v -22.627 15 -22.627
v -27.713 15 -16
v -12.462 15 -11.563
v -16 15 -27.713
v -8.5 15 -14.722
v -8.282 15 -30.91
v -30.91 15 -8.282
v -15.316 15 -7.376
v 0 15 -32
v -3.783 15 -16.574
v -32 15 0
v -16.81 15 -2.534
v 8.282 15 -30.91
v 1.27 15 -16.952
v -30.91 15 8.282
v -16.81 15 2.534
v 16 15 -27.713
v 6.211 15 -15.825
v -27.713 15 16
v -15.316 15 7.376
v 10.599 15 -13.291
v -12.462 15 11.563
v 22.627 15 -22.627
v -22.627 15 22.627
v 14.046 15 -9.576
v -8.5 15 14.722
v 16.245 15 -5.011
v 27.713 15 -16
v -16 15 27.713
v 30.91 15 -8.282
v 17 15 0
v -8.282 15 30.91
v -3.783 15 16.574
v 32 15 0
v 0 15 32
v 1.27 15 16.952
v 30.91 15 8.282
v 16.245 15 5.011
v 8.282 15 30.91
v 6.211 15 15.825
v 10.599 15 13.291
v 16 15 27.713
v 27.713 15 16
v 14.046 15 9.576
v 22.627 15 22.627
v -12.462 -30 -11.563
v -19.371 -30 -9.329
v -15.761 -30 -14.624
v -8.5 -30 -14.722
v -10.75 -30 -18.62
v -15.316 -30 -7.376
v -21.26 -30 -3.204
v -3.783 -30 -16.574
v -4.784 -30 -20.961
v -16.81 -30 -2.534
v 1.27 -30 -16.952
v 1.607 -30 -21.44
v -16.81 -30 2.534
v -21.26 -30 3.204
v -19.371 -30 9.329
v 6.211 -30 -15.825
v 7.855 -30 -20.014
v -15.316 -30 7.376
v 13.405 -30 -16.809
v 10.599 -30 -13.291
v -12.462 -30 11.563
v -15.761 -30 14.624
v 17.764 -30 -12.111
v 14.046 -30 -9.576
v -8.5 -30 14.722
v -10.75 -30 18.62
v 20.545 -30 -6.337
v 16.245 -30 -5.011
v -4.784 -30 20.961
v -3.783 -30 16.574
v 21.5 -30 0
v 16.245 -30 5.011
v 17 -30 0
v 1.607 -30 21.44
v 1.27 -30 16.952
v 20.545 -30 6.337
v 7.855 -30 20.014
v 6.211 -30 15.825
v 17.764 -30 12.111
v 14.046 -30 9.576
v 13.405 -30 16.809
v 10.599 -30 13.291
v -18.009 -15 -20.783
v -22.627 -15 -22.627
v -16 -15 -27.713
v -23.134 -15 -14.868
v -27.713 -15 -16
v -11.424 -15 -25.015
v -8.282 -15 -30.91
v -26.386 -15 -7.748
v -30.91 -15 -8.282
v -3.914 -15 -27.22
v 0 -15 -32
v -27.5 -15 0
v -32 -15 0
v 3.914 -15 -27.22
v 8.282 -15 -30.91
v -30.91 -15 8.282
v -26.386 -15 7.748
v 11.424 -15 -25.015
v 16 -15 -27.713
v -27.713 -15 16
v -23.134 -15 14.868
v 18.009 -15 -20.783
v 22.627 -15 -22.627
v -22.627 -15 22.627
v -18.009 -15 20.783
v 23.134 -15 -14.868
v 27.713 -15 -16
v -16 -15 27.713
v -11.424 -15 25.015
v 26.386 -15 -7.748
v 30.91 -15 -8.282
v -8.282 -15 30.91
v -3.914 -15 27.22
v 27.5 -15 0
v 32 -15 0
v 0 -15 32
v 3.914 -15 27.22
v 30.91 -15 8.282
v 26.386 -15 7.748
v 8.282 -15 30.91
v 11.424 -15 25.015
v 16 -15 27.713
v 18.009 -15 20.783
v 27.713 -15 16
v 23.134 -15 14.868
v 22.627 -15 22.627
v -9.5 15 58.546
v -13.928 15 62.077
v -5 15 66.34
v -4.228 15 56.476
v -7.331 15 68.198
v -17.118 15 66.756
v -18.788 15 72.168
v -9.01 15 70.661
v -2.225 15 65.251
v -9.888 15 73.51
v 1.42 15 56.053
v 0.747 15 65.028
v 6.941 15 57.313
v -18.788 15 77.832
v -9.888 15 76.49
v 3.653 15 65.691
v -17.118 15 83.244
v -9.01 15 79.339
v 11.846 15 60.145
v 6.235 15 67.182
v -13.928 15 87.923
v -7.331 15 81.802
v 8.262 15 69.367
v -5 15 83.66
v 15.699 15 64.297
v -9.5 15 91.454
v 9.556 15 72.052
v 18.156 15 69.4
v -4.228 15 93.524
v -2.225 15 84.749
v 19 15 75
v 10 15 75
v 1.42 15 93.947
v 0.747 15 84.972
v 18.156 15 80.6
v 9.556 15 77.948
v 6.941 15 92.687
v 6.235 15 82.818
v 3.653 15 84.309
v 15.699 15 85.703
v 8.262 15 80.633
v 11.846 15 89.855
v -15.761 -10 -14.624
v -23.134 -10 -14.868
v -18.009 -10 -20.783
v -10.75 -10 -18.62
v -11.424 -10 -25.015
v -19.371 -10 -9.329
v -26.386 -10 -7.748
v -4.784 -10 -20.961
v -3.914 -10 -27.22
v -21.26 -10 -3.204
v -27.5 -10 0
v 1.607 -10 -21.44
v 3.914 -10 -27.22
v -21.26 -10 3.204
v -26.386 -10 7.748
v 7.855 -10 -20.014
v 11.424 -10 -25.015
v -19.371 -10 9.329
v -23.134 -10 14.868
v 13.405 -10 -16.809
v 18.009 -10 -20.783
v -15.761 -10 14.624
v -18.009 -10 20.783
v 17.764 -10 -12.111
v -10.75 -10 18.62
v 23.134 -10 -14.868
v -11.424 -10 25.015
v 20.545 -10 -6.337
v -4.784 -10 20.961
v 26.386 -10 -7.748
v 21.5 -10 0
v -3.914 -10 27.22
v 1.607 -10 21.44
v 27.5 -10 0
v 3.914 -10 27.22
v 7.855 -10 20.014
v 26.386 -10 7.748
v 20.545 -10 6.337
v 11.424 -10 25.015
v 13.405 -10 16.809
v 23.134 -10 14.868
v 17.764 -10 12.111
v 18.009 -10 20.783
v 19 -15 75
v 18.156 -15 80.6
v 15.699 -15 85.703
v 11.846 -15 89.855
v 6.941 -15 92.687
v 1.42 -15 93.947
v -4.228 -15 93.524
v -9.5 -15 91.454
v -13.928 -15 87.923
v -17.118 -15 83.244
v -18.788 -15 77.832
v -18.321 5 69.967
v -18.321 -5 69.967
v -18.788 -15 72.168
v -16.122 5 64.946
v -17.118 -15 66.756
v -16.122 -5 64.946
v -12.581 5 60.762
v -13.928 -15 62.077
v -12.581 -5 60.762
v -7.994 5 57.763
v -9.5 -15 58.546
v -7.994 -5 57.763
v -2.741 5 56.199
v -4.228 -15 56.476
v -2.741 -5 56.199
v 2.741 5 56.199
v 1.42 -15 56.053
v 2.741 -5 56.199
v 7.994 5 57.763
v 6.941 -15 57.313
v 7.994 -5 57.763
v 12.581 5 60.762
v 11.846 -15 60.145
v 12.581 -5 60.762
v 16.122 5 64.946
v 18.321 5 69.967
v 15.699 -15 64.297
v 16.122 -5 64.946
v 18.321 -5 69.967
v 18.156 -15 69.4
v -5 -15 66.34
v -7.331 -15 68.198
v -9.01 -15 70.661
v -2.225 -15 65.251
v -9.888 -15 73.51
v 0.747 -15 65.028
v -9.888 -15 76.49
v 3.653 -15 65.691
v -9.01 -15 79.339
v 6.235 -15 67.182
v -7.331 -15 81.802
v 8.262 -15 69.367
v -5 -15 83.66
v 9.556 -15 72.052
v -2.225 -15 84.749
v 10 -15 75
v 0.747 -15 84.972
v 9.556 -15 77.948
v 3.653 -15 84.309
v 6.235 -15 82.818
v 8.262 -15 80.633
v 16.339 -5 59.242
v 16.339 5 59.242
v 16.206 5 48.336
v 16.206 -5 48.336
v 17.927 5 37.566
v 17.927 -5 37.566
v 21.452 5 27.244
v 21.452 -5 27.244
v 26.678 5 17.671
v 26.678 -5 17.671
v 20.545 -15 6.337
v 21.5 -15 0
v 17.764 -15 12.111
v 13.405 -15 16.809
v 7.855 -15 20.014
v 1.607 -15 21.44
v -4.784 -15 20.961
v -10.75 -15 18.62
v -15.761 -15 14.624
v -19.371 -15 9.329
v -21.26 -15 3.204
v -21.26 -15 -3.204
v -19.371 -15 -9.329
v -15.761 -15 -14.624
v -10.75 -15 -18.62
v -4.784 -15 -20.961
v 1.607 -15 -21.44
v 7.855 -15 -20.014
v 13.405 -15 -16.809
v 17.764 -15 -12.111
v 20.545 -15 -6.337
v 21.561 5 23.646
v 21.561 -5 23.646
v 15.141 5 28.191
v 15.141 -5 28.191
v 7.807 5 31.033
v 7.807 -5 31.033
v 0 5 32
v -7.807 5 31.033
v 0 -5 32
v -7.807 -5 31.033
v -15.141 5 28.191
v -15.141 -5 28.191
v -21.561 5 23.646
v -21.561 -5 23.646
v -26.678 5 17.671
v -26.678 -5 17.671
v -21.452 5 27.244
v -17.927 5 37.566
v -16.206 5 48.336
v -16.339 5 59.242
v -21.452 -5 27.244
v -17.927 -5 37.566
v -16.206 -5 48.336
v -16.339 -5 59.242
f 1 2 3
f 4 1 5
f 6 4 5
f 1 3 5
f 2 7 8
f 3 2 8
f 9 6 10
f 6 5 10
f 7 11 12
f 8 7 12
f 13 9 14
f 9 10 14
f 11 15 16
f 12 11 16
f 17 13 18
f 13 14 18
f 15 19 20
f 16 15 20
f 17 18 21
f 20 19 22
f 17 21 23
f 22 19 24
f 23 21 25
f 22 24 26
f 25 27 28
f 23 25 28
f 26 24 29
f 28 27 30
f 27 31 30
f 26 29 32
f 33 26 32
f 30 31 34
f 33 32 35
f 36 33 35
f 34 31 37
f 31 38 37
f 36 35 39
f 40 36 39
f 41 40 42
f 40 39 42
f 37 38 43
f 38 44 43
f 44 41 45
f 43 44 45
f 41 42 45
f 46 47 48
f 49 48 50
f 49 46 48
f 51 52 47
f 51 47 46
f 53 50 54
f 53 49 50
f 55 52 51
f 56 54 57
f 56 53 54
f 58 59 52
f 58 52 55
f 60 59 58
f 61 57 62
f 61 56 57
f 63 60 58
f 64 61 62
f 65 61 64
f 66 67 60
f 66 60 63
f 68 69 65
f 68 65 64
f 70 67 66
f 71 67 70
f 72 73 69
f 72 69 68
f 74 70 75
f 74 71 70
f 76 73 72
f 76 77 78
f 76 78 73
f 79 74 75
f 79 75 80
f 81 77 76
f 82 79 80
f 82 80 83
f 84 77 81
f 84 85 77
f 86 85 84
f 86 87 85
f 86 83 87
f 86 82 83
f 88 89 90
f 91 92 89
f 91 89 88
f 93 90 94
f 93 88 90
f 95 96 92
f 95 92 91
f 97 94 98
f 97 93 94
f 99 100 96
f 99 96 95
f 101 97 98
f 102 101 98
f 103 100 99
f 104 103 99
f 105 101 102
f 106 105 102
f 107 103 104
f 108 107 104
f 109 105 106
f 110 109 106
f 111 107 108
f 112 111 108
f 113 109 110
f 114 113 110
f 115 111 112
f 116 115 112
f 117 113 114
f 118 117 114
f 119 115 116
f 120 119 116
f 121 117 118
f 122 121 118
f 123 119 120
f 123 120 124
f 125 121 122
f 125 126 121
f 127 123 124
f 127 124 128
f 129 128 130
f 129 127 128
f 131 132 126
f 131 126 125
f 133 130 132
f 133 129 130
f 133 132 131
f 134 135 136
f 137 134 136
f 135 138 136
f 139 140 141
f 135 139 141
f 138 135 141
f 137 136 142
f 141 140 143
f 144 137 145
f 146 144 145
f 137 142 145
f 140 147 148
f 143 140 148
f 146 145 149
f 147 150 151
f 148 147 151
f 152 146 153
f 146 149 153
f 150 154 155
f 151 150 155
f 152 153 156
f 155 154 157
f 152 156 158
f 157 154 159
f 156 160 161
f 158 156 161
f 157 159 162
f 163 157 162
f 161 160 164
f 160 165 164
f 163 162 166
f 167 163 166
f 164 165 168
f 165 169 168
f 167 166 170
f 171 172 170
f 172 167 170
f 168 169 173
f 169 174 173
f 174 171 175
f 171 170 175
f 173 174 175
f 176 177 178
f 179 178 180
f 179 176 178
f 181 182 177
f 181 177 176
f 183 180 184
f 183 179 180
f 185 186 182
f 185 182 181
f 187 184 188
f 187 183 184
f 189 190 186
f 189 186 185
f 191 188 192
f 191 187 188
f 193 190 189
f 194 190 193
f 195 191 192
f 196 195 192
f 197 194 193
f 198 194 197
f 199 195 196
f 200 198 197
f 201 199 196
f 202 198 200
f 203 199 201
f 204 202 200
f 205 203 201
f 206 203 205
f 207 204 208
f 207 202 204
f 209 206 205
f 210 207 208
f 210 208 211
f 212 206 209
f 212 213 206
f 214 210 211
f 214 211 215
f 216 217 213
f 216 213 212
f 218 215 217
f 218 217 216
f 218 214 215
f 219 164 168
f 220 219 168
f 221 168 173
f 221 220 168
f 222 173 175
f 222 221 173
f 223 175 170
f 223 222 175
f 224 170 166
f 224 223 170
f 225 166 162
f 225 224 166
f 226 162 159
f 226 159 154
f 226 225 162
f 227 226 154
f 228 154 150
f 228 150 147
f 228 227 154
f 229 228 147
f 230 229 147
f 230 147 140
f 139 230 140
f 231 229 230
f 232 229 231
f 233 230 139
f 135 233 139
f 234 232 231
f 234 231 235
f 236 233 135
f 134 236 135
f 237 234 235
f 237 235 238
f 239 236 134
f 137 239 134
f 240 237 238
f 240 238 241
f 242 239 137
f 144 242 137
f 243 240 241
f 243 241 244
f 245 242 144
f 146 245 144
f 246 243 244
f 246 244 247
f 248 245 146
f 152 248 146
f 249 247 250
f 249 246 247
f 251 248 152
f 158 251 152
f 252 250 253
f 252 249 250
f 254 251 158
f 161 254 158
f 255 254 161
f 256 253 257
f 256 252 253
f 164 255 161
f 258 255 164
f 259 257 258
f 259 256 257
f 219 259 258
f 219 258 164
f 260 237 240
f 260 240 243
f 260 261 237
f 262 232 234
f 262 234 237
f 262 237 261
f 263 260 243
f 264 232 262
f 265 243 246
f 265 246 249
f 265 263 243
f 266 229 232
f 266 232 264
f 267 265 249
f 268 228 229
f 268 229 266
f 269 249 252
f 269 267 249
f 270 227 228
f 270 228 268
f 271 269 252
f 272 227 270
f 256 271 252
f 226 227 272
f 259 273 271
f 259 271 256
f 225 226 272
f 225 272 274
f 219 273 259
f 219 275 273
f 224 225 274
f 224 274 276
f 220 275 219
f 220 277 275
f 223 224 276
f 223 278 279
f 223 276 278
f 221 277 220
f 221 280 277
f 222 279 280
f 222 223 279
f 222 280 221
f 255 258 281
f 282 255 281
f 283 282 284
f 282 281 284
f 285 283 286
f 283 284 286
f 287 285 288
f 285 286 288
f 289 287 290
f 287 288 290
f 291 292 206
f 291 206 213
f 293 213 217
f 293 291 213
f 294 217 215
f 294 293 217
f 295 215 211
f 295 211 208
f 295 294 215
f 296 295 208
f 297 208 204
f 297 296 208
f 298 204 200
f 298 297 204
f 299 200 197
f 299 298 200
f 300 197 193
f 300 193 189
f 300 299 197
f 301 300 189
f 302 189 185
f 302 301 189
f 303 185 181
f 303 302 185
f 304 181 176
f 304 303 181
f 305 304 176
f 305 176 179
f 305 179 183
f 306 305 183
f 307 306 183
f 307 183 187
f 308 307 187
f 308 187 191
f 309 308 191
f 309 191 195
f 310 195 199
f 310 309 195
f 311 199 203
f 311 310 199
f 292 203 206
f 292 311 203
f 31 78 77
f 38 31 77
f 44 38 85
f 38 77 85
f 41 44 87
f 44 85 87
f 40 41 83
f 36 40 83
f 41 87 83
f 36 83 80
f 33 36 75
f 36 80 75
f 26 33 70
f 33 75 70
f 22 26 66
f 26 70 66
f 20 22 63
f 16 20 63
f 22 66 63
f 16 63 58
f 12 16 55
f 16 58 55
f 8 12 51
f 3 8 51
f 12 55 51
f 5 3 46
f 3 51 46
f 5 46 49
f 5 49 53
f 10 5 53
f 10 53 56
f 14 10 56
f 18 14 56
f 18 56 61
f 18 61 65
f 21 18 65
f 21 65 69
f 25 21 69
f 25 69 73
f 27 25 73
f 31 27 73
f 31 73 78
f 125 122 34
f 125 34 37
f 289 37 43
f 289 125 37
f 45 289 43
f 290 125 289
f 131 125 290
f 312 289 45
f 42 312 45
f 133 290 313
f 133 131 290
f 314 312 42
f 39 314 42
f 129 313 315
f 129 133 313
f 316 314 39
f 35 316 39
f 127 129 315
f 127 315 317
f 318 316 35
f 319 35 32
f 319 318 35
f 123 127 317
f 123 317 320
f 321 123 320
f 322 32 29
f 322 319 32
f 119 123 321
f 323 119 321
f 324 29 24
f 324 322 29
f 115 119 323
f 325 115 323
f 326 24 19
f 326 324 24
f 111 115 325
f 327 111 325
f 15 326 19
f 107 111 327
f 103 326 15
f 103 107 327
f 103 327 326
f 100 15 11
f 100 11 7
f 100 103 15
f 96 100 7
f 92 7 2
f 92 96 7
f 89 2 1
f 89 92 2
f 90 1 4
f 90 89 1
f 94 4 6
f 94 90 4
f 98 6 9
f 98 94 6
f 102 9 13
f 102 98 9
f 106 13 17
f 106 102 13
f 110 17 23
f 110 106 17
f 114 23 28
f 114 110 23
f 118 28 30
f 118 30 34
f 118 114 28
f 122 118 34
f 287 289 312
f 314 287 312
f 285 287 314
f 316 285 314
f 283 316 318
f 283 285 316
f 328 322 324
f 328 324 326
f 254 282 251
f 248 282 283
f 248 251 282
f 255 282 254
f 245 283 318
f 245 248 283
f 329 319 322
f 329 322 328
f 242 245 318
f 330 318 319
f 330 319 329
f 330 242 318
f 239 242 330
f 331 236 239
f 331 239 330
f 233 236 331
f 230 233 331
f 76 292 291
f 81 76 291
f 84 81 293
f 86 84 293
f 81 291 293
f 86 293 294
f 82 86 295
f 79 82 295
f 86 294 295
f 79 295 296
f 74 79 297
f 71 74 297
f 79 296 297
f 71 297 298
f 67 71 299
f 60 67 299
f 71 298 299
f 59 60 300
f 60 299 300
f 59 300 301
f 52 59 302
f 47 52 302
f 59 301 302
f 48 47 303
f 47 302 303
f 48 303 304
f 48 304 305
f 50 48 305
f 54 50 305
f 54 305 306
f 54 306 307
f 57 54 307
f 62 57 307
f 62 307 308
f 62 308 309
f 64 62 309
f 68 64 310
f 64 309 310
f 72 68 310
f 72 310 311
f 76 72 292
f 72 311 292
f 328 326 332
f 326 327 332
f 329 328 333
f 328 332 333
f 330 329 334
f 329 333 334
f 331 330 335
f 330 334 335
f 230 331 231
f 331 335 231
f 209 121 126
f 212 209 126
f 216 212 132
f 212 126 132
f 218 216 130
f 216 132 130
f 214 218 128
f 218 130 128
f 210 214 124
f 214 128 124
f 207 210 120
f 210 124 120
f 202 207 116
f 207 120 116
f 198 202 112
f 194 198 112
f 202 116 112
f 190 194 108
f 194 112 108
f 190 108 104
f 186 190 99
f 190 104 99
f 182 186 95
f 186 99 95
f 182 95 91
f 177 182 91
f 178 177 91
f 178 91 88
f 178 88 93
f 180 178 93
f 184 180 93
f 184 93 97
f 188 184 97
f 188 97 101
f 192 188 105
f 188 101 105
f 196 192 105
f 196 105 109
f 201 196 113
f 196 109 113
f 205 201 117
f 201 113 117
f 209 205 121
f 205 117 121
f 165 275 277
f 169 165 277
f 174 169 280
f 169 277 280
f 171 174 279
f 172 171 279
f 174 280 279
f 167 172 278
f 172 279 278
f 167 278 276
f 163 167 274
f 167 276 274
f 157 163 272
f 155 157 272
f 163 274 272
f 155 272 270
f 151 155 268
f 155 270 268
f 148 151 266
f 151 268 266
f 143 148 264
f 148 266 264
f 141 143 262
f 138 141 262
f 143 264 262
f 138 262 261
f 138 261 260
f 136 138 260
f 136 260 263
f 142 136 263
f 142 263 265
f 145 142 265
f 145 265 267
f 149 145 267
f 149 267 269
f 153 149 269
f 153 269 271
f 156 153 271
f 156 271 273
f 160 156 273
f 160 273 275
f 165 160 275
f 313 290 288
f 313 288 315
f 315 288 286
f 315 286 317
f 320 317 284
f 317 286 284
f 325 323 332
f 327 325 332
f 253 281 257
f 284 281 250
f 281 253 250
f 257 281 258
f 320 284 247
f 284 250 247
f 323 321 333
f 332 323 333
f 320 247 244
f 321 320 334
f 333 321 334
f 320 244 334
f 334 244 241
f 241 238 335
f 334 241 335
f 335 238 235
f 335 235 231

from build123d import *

# Parameters (mm, degrees)
SKETCH_R        = 32
PAD_DEPTH       = 15
PAD001_DEPTH    = 5
SKETCH002_R     = 19
PAD002_DEPTH    = 15
SKETCH003_R     = 27.5
SKETCH003_R_2   = 21.5
POCKET_DEPTH    = 5
SKETCH004_R     = 21.5
PAD003_DEPTH    = 15
SKETCH005_R     = 17
POCKET001_DEPTH = 45.001
SKETCH006_R     = 10
POCKET002_DEPTH = 30.001


with BuildPart() as part:
    # Sketch → Pad (new body, symmetric)
    with BuildSketch(Plane.XZ):
        Circle(SKETCH_R)
    extrude(amount=PAD_DEPTH, both=True)

    # Sketch001 → Pad001 (join, symmetric)
    with BuildSketch(Plane.XZ):
        with BuildLine():
            ThreePointArc((26.6782831974, 17.6711404736), (-1.75595e-05, 32), (-26.678302591, 17.671111195))
            ThreePointArc((-26.678302591, 17.671111195), (-16.8367727335, 42.9140409584), (-18.3212438006, 69.9669069549))
            ThreePointArc((-18.3212438006, 69.9669069549), (-1.6382e-05, 56), (18.3212351214, 69.9668753614))
            ThreePointArc((18.3212351214, 69.9668753614), (16.8367725476, 42.9140421212), (26.6782831975, 17.6711404736))
        make_face()
    extrude(amount=PAD001_DEPTH, both=True)

    # Sketch002 → Pad002 (join, symmetric)
    with BuildSketch(Plane.XZ):
        with Locations((0, 75)):
            Circle(SKETCH002_R)
    extrude(amount=PAD002_DEPTH, both=True)

    # Sketch003 (on Face10 of Pad002) → Pocket (cut)
    with BuildSketch(Plane.XZ.offset(15)):
        Circle(SKETCH003_R)
        Circle(SKETCH003_R_2, mode=Mode.SUBTRACT)
    extrude(amount=-POCKET_DEPTH, mode=Mode.SUBTRACT)

    # Sketch004 (on Face14 of Pocket) → Pad003 (join)
    with BuildSketch(Plane.XZ.offset(15)):
        Circle(SKETCH004_R)
    extrude(amount=PAD003_DEPTH)

    # Sketch005 (on Face15 of Pad003) → Pocket001 (cut, through all)
    with BuildSketch(Plane.XZ.offset(30)):
        Circle(SKETCH005_R)
    extrude(amount=-POCKET001_DEPTH, mode=Mode.SUBTRACT)

    # Sketch006 (on Face3 of Pocket001) → Pocket002 (cut, through all)
    with BuildSketch(Plane.XZ.offset(15)):
        with Locations((0, 75)):
            Circle(SKETCH006_R)
    extrude(amount=-POCKET002_DEPTH, mode=Mode.SUBTRACT)


solid = part.part
